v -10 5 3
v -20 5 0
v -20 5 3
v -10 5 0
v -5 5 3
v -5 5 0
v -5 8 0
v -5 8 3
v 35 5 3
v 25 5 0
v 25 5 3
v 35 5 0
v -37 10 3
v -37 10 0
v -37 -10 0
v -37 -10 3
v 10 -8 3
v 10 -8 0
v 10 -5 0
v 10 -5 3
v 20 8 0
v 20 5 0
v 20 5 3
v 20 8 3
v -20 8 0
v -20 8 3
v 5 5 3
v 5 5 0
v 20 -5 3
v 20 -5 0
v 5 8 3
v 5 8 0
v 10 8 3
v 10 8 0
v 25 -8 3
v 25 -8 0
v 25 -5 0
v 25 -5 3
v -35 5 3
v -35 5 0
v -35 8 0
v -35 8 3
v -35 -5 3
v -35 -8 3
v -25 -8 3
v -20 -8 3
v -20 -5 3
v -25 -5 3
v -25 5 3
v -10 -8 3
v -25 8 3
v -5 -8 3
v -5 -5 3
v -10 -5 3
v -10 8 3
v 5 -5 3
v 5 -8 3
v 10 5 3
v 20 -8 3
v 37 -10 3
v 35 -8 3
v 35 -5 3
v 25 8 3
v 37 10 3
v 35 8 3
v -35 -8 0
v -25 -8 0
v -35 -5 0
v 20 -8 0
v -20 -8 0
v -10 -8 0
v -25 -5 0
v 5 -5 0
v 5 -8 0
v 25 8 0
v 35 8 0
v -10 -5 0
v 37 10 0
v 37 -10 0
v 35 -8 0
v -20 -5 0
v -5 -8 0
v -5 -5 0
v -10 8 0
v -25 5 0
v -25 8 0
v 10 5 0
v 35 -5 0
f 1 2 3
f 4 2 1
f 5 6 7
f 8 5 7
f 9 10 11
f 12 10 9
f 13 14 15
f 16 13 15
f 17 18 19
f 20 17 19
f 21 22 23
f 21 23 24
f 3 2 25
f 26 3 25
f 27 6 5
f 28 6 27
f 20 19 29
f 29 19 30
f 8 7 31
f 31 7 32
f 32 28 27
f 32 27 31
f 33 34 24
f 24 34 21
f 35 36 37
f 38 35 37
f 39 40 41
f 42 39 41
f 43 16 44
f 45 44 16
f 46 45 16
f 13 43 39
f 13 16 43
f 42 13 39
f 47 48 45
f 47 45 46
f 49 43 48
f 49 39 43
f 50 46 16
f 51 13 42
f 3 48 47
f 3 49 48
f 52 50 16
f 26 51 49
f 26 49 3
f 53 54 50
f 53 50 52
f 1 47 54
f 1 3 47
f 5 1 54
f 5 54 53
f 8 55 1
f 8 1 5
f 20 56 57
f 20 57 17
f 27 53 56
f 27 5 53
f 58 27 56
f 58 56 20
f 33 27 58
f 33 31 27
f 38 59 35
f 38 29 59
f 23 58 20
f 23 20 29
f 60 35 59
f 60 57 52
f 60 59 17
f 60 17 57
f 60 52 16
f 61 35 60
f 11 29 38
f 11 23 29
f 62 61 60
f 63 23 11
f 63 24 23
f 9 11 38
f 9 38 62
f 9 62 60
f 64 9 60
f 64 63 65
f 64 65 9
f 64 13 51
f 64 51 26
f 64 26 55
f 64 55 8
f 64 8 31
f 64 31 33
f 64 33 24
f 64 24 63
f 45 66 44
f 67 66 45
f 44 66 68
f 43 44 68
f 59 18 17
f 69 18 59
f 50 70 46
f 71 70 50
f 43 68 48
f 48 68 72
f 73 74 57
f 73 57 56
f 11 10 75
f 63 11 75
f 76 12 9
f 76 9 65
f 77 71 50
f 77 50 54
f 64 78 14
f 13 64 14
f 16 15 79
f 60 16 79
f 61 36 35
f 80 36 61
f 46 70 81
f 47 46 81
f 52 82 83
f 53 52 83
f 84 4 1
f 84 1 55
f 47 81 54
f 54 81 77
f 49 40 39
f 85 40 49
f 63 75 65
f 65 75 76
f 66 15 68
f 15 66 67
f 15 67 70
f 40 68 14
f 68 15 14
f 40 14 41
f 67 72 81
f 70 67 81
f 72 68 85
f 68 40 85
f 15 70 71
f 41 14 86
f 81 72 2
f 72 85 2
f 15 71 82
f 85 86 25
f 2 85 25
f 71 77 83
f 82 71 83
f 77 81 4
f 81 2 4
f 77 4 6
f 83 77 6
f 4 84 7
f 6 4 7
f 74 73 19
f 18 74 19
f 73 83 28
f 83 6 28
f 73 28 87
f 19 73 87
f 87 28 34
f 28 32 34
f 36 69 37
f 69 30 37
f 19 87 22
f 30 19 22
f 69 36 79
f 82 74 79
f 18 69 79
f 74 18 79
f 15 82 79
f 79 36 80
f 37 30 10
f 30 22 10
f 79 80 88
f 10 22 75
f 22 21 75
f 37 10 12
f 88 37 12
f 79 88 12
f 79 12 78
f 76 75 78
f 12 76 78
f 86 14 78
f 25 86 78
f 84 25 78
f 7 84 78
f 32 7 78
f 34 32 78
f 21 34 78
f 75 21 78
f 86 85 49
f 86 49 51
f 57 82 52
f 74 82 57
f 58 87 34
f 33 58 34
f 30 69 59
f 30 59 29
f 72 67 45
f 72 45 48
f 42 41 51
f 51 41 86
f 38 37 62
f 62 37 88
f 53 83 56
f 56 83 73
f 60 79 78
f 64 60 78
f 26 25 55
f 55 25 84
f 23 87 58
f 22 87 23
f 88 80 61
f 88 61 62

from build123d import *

# Parameters (mm, degrees)
SKETCH_1_W      = 10
SKETCH_1_H      = 3
EXTRUDE_3_DEPTH = 3


with BuildPart() as part:
    # 草图1 → 凸台-拉伸3 (new body)
    with BuildSketch(Plane.XY):
        Polygon((-37, 5), (-37, -5), (-37, -10), (37, -10), (37, -5), (37, 5), (37, 10), (-37, 10), align=None)
        with Locations((-15, 6.5)):
            Rectangle(SKETCH_1_W, SKETCH_1_H, mode=Mode.SUBTRACT)
        with Locations((-30, 6.5)):
            Rectangle(SKETCH_1_W, SKETCH_1_H, mode=Mode.SUBTRACT)
        with Locations((0, 6.5)):
            Rectangle(SKETCH_1_W, SKETCH_1_H, mode=Mode.SUBTRACT)
        with Locations((15, 6.5)):
            Rectangle(SKETCH_1_W, SKETCH_1_H, mode=Mode.SUBTRACT)
        with Locations((30, 6.5)):
            Rectangle(SKETCH_1_W, SKETCH_1_H, mode=Mode.SUBTRACT)
        with Locations((30, -6.5)):
            Rectangle(SKETCH_1_W, SKETCH_1_H, mode=Mode.SUBTRACT)
        with Locations((15, -6.5)):
            Rectangle(SKETCH_1_W, SKETCH_1_H, mode=Mode.SUBTRACT)
        with Locations((0, -6.5)):
            Rectangle(SKETCH_1_W, SKETCH_1_H, mode=Mode.SUBTRACT)
        with Locations((-15, -6.5)):
            Rectangle(SKETCH_1_W, SKETCH_1_H, mode=Mode.SUBTRACT)
        with Locations((-30, -6.5)):
            Rectangle(SKETCH_1_W, SKETCH_1_H, mode=Mode.SUBTRACT)
    extrude(amount=EXTRUDE_3_DEPTH)


solid = part.part
